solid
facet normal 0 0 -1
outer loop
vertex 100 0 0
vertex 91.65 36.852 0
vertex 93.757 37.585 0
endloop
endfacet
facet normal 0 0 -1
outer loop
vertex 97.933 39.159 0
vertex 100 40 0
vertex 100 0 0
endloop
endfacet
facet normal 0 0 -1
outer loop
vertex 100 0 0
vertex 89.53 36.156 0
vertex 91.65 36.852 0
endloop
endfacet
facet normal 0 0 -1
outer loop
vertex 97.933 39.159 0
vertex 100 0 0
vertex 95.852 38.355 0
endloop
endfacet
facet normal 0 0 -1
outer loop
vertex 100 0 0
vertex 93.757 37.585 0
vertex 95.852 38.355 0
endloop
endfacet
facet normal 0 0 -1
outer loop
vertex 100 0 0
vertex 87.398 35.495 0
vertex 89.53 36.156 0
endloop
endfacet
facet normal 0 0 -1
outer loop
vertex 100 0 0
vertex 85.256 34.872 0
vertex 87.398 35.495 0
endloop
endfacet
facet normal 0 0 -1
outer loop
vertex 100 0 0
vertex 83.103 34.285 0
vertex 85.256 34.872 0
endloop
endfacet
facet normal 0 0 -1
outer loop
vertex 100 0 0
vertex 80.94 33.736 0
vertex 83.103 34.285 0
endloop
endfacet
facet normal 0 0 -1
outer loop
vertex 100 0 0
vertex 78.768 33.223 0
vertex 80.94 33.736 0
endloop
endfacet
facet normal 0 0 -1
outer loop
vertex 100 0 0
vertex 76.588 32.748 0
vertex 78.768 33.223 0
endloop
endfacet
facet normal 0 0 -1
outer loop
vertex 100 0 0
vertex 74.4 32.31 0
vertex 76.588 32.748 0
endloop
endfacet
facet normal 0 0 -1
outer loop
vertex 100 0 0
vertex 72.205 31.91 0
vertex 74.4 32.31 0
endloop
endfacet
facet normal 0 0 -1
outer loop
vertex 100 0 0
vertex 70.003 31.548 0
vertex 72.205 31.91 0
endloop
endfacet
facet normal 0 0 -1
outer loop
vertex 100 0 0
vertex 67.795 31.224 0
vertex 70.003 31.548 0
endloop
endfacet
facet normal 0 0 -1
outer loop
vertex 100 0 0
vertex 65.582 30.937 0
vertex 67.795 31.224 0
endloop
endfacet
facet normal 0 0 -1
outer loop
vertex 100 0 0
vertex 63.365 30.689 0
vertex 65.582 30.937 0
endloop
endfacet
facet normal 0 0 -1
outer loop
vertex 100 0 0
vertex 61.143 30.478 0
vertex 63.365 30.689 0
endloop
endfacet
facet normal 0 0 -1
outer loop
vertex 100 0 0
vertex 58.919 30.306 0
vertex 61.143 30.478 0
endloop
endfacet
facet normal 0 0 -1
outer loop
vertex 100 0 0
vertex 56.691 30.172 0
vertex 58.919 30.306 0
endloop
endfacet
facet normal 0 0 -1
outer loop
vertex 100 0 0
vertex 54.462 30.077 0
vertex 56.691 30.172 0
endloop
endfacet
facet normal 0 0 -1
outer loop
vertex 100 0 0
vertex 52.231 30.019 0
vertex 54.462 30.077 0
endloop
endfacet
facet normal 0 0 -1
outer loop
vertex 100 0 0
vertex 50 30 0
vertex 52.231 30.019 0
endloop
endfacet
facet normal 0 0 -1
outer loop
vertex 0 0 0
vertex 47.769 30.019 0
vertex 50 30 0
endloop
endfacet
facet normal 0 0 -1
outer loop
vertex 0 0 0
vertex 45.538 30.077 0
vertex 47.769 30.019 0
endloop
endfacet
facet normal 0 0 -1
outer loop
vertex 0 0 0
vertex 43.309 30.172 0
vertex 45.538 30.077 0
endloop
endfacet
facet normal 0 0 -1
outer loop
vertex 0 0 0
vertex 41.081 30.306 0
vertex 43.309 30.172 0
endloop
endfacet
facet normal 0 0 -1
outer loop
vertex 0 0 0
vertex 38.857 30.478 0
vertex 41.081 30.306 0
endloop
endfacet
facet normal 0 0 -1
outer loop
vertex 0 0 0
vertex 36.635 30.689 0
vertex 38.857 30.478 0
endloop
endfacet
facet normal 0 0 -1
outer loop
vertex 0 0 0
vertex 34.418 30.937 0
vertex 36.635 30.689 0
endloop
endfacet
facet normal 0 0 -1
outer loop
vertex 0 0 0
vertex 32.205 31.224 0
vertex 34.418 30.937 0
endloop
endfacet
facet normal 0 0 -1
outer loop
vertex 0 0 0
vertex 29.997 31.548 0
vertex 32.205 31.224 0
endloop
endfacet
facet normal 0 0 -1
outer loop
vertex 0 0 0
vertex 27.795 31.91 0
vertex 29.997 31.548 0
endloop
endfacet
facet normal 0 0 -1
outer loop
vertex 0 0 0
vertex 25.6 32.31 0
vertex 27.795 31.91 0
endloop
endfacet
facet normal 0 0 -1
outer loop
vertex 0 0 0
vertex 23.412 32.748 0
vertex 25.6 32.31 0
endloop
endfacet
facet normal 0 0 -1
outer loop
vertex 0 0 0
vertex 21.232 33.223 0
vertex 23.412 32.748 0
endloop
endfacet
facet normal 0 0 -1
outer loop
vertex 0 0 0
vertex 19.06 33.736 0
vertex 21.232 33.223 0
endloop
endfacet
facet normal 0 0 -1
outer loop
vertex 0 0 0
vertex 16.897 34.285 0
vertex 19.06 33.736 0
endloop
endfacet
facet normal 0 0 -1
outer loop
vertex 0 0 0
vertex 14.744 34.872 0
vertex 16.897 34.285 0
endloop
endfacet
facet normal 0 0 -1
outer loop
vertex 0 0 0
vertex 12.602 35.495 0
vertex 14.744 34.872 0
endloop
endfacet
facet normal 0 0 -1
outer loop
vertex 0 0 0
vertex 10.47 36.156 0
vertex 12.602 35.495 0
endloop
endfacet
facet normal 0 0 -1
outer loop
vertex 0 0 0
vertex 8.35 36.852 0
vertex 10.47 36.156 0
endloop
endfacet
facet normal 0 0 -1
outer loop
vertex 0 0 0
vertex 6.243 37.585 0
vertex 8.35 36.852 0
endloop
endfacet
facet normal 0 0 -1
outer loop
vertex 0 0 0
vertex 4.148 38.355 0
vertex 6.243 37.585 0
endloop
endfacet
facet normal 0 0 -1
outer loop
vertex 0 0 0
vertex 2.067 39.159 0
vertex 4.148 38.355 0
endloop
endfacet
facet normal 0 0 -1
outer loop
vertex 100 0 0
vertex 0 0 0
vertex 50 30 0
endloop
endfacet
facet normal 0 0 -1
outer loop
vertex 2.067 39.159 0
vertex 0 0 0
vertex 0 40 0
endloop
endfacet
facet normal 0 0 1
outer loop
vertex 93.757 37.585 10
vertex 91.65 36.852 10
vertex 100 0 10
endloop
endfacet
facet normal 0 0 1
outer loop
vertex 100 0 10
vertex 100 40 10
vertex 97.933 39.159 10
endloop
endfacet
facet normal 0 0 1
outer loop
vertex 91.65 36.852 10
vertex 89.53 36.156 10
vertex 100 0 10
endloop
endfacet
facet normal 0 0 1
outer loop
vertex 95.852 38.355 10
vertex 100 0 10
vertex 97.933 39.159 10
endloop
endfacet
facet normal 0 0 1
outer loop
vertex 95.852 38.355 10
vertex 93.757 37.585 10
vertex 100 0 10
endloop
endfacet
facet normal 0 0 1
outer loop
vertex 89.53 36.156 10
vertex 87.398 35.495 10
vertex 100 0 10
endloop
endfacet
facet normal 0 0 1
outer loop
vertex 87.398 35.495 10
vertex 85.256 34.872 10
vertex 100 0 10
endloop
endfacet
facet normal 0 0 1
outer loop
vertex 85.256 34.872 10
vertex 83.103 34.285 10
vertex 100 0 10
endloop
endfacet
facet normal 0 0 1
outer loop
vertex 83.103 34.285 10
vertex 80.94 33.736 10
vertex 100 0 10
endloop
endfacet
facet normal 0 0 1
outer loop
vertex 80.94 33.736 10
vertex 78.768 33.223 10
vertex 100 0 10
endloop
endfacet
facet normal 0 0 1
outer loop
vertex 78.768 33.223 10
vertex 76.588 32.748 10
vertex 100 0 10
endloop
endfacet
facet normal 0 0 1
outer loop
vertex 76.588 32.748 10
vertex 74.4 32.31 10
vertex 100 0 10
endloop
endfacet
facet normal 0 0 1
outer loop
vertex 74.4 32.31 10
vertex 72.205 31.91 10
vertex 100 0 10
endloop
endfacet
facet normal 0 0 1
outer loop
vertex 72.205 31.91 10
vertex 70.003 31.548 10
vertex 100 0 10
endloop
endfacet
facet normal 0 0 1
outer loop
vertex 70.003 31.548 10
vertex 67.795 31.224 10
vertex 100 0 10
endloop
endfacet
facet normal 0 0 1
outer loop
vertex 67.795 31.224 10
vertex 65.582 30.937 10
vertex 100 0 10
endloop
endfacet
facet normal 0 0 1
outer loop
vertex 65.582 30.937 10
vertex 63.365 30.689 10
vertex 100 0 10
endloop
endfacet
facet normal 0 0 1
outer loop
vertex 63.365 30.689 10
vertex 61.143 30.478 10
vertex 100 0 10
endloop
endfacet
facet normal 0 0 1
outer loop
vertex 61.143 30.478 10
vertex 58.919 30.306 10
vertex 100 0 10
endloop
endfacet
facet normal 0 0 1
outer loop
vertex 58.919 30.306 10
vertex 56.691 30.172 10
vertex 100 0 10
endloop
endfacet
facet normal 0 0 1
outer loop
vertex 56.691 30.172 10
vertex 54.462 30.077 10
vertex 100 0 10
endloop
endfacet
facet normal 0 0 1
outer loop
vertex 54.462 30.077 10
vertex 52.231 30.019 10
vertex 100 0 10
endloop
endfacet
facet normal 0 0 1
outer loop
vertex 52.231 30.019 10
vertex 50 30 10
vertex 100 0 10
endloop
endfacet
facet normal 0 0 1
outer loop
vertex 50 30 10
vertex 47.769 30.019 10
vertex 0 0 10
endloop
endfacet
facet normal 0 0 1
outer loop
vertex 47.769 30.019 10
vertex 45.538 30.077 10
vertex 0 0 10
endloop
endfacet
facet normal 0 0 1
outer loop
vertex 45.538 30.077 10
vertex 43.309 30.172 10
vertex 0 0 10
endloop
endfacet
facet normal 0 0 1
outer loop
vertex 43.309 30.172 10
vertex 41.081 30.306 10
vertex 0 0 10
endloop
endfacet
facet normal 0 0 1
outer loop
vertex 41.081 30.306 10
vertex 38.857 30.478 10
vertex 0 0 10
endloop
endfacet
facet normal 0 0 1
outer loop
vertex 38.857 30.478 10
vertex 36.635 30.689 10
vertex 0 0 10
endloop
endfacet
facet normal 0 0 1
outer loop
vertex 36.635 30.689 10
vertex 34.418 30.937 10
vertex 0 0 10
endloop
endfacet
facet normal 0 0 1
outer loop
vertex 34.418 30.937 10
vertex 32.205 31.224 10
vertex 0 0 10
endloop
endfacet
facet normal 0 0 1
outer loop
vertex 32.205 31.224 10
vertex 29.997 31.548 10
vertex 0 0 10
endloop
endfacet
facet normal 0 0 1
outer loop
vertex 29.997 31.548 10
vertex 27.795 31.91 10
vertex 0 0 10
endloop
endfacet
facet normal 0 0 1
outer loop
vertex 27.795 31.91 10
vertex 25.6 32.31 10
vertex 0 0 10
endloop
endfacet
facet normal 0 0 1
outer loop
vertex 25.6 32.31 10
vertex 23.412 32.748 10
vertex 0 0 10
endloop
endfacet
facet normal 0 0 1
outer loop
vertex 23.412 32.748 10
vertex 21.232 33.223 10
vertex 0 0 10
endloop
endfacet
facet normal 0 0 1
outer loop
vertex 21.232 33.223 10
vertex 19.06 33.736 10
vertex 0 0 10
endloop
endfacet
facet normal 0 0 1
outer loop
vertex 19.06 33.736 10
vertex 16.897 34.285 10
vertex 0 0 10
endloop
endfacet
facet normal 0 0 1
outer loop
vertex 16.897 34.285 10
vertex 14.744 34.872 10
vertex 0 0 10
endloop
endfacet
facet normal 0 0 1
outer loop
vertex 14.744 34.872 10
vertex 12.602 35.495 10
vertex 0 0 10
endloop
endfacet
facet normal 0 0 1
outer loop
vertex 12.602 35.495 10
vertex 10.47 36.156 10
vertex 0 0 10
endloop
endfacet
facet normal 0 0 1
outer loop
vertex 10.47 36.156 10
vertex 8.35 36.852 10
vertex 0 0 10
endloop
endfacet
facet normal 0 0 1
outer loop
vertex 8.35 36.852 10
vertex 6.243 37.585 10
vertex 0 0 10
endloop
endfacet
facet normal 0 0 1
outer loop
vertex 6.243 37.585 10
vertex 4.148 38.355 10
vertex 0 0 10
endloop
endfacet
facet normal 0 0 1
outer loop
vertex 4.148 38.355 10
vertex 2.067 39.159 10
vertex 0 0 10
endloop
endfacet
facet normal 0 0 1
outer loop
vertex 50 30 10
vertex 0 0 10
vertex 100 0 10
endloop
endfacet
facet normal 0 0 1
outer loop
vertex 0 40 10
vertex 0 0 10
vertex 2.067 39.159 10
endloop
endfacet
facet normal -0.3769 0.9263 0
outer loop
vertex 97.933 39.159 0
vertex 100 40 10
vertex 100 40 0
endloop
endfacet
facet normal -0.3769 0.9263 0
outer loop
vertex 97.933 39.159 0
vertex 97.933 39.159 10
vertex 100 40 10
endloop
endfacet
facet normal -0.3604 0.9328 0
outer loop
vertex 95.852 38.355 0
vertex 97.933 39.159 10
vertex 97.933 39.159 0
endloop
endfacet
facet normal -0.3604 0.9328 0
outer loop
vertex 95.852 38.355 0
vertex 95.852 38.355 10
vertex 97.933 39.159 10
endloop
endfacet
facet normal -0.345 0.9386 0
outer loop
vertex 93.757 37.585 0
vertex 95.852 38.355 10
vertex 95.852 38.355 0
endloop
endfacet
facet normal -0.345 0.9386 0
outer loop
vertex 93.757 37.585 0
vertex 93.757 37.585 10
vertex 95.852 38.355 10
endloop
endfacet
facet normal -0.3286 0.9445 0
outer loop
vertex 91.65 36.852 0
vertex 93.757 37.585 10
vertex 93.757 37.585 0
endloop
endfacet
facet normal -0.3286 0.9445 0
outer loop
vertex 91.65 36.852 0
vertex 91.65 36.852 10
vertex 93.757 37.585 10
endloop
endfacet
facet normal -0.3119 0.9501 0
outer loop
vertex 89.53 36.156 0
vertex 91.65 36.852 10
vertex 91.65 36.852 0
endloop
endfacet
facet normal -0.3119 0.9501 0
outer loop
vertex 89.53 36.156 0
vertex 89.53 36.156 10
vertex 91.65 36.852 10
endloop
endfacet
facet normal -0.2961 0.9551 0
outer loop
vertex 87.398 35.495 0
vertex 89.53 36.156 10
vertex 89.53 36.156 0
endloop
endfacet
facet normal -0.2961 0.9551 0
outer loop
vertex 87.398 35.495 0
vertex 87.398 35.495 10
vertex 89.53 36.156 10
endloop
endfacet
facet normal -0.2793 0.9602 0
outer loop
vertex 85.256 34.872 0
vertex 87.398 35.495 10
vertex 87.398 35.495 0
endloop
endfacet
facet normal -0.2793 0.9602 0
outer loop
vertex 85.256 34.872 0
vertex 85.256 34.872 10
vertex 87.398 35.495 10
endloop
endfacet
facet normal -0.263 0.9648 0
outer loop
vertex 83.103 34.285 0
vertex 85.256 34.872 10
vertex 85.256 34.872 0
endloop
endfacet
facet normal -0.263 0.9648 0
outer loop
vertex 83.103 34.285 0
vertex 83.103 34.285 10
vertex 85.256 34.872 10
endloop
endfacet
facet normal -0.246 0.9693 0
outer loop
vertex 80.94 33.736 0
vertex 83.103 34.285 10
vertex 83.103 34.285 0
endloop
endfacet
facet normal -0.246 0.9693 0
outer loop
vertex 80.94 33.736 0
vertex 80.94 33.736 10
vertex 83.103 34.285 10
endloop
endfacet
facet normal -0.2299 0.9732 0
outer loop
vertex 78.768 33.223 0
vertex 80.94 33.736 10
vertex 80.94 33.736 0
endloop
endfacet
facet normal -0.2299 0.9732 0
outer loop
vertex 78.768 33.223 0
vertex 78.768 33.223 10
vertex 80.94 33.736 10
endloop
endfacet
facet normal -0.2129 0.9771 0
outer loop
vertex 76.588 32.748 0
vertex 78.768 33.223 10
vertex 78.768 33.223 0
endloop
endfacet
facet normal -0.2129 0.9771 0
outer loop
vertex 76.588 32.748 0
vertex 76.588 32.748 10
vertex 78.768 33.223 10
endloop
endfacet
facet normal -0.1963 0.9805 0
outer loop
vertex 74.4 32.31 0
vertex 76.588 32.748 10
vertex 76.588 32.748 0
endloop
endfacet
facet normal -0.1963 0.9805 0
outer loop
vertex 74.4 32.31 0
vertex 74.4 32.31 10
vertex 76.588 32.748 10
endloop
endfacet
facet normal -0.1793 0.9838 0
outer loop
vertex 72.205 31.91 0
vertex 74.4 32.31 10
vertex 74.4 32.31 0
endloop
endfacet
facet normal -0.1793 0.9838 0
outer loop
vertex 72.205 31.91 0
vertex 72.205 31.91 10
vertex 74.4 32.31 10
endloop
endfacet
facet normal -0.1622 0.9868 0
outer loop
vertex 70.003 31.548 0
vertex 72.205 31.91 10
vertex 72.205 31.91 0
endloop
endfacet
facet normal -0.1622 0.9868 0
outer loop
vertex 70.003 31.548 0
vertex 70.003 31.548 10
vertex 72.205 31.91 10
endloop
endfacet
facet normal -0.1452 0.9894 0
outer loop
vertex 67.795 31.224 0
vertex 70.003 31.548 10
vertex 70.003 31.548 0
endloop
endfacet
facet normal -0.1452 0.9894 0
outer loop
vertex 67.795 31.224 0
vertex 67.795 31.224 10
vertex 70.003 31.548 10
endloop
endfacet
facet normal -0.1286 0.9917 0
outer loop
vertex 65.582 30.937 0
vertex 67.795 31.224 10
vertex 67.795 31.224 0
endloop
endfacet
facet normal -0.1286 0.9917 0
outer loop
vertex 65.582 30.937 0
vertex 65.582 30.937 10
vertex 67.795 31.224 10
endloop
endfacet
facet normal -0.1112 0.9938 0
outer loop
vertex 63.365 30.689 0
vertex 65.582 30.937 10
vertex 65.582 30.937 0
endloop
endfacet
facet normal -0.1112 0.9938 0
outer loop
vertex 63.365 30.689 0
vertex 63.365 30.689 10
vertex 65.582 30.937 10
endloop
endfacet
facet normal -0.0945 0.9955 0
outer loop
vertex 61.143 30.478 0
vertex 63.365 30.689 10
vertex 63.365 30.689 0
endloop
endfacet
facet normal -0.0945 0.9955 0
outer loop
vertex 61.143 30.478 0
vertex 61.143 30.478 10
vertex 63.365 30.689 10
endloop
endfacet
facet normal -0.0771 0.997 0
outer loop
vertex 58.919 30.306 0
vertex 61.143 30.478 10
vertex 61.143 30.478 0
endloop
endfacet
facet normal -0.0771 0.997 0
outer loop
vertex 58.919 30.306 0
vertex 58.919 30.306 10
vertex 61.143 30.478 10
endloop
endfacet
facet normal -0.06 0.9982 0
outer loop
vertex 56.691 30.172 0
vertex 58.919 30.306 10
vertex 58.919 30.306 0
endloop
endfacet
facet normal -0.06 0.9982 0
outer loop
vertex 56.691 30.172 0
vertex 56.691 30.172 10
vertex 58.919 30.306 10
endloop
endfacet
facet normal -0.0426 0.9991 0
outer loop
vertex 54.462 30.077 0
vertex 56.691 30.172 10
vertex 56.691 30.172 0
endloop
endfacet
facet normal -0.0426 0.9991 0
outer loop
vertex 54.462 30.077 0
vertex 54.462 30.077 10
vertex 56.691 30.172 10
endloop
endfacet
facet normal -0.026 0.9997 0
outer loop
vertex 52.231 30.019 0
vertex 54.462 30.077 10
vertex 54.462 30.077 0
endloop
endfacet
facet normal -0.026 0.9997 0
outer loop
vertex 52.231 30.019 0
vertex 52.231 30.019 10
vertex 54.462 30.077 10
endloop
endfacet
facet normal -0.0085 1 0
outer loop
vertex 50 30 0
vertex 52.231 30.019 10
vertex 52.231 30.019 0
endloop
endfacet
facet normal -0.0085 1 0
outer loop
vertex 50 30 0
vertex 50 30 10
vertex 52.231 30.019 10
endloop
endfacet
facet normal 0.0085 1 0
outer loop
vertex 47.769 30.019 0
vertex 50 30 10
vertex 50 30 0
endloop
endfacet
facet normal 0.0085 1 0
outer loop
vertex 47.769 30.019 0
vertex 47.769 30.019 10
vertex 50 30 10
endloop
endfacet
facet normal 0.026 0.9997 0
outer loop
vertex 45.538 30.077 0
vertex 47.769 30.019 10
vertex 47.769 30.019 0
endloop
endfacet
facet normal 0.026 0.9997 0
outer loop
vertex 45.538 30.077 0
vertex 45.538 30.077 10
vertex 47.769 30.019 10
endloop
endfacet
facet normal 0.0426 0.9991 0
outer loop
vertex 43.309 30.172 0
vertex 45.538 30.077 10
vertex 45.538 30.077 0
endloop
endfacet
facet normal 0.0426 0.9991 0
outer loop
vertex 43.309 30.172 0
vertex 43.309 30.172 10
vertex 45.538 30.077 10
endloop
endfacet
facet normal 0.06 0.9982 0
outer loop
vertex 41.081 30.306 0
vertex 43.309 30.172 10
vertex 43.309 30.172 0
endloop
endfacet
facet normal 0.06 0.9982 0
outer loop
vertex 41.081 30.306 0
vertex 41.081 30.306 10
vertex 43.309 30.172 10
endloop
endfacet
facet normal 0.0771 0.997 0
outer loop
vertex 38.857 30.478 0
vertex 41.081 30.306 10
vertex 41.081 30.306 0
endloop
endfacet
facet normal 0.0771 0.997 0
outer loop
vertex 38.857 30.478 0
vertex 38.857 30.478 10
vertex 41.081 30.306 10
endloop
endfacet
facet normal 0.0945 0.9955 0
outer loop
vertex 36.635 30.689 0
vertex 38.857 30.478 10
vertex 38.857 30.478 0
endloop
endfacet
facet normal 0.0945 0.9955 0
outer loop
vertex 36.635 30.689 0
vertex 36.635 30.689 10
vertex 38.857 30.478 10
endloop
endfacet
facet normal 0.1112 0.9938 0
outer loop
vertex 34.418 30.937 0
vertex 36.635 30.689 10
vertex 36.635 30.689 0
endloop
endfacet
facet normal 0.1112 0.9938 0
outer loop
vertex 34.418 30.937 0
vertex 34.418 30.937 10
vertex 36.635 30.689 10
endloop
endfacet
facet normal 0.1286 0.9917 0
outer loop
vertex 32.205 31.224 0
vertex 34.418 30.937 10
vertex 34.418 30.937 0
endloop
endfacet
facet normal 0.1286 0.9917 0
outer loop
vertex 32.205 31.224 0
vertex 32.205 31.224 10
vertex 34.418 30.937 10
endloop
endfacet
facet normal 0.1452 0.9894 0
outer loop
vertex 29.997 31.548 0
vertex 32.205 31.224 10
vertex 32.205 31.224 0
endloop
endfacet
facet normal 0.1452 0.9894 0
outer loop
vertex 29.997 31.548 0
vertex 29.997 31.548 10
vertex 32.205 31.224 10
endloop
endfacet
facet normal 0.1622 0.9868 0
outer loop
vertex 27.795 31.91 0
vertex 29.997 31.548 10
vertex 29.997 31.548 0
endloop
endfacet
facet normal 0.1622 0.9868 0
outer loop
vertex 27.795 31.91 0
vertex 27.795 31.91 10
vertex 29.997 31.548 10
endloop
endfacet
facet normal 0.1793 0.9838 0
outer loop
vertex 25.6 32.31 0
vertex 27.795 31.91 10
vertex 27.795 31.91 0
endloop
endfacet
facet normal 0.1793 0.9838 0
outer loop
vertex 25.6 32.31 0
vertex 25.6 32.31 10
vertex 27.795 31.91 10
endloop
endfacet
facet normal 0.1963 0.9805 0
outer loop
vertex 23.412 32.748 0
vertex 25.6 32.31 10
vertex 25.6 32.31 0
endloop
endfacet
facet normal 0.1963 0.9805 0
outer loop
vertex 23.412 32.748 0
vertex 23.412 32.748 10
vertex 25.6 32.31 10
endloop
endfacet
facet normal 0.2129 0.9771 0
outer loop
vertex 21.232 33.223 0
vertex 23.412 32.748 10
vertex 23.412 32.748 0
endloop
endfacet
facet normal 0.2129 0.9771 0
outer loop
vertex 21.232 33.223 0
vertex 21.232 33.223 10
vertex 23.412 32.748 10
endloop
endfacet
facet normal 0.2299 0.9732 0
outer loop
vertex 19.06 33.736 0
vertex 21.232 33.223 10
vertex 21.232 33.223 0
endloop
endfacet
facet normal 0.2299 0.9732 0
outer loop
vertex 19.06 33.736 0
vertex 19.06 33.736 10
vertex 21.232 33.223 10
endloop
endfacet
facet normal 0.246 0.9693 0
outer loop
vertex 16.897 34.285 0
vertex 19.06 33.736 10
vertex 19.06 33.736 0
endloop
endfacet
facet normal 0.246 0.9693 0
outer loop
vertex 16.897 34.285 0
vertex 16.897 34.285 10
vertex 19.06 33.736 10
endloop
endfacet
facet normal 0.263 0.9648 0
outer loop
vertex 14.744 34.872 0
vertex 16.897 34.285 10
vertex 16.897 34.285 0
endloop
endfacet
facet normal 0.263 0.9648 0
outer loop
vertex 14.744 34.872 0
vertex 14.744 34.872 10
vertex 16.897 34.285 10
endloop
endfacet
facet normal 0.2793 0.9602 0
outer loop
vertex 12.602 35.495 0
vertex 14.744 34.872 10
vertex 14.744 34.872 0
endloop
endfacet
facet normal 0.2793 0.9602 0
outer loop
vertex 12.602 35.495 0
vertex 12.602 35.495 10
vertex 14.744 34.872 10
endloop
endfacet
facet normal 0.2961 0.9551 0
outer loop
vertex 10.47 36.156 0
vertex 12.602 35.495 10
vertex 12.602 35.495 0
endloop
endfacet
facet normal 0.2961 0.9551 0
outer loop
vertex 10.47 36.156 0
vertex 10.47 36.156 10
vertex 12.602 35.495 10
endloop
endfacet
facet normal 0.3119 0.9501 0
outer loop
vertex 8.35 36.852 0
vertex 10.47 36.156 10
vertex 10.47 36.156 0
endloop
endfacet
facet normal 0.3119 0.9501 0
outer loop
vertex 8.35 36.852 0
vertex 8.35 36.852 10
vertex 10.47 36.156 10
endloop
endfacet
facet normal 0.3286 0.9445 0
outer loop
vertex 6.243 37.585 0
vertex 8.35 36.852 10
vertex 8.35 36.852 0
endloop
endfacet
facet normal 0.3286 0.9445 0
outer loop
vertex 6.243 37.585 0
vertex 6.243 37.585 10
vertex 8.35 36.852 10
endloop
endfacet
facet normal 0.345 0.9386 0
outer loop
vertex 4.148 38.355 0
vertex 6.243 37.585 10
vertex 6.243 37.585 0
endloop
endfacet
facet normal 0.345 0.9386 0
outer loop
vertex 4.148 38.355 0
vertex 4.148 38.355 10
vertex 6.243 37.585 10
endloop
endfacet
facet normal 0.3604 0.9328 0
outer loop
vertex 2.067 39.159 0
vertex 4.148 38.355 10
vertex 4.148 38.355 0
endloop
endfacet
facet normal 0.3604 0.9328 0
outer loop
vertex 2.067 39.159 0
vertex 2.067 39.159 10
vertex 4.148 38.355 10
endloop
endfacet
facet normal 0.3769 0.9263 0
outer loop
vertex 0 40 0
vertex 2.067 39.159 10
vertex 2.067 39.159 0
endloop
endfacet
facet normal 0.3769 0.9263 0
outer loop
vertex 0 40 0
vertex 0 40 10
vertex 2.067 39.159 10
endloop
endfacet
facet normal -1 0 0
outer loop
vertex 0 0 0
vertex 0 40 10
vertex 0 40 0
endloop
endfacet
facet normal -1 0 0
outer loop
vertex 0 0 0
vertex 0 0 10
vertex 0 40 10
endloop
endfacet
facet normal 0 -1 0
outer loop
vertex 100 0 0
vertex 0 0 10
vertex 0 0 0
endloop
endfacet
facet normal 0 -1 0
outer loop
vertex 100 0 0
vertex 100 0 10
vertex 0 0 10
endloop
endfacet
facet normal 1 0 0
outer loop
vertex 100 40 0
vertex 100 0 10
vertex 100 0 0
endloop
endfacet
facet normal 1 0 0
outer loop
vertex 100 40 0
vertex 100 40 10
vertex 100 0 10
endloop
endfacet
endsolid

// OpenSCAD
$fn = 32;

// ----------------------------------------------------------------------
// Arc profile plate: notch, 49 points
// ----------------------------------------------------------------------

// --- parameters (mm) ---
bar_l = 100;              // bar length, X
bar_w = 40;               // bar width, Y
notch_depth = 10;         // depth of the arc notch at mid-span
arc_r = 130;              // radius of the notch arc
arc_angle = 45.24;        // notch arc angle, degrees
arc_step = 1;             // sampling step of the notch arc, degrees
plate_t = 10;             // plate thickness, Z

profile = [[0, 0], [100, 0], [100, 40], [97.933, 39.159], [95.852, 38.355], [93.757, 37.585], [91.65, 36.852], [89.53, 36.156], [87.398, 35.495], [85.256, 34.872], [83.103, 34.285], [80.94, 33.736], [78.768, 33.223], [76.588, 32.748], [74.4, 32.31], [72.205, 31.91], [70.003, 31.548], [67.795, 31.224], [65.582, 30.937], [63.365, 30.689], [61.143, 30.478], [58.919, 30.306], [56.691, 30.172], [54.462, 30.077], [52.231, 30.019], [50, 30], [47.769, 30.019], [45.538, 30.077], [43.309, 30.172], [41.081, 30.306], [38.857, 30.478], [36.635, 30.689], [34.418, 30.937], [32.205, 31.224], [29.997, 31.548], [27.795, 31.91], [25.6, 32.31], [23.412, 32.748], [21.232, 33.223], [19.06, 33.736], [16.897, 34.285], [14.744, 34.872], [12.602, 35.495], [10.47, 36.156], [8.35, 36.852], [6.243, 37.585], [4.148, 38.355], [2.067, 39.159], [0, 40]];  // primary outline, 49 points, counter clockwise

// --- the one profile operation ---
linear_extrude(height = plate_t) polygon(points = profile);
